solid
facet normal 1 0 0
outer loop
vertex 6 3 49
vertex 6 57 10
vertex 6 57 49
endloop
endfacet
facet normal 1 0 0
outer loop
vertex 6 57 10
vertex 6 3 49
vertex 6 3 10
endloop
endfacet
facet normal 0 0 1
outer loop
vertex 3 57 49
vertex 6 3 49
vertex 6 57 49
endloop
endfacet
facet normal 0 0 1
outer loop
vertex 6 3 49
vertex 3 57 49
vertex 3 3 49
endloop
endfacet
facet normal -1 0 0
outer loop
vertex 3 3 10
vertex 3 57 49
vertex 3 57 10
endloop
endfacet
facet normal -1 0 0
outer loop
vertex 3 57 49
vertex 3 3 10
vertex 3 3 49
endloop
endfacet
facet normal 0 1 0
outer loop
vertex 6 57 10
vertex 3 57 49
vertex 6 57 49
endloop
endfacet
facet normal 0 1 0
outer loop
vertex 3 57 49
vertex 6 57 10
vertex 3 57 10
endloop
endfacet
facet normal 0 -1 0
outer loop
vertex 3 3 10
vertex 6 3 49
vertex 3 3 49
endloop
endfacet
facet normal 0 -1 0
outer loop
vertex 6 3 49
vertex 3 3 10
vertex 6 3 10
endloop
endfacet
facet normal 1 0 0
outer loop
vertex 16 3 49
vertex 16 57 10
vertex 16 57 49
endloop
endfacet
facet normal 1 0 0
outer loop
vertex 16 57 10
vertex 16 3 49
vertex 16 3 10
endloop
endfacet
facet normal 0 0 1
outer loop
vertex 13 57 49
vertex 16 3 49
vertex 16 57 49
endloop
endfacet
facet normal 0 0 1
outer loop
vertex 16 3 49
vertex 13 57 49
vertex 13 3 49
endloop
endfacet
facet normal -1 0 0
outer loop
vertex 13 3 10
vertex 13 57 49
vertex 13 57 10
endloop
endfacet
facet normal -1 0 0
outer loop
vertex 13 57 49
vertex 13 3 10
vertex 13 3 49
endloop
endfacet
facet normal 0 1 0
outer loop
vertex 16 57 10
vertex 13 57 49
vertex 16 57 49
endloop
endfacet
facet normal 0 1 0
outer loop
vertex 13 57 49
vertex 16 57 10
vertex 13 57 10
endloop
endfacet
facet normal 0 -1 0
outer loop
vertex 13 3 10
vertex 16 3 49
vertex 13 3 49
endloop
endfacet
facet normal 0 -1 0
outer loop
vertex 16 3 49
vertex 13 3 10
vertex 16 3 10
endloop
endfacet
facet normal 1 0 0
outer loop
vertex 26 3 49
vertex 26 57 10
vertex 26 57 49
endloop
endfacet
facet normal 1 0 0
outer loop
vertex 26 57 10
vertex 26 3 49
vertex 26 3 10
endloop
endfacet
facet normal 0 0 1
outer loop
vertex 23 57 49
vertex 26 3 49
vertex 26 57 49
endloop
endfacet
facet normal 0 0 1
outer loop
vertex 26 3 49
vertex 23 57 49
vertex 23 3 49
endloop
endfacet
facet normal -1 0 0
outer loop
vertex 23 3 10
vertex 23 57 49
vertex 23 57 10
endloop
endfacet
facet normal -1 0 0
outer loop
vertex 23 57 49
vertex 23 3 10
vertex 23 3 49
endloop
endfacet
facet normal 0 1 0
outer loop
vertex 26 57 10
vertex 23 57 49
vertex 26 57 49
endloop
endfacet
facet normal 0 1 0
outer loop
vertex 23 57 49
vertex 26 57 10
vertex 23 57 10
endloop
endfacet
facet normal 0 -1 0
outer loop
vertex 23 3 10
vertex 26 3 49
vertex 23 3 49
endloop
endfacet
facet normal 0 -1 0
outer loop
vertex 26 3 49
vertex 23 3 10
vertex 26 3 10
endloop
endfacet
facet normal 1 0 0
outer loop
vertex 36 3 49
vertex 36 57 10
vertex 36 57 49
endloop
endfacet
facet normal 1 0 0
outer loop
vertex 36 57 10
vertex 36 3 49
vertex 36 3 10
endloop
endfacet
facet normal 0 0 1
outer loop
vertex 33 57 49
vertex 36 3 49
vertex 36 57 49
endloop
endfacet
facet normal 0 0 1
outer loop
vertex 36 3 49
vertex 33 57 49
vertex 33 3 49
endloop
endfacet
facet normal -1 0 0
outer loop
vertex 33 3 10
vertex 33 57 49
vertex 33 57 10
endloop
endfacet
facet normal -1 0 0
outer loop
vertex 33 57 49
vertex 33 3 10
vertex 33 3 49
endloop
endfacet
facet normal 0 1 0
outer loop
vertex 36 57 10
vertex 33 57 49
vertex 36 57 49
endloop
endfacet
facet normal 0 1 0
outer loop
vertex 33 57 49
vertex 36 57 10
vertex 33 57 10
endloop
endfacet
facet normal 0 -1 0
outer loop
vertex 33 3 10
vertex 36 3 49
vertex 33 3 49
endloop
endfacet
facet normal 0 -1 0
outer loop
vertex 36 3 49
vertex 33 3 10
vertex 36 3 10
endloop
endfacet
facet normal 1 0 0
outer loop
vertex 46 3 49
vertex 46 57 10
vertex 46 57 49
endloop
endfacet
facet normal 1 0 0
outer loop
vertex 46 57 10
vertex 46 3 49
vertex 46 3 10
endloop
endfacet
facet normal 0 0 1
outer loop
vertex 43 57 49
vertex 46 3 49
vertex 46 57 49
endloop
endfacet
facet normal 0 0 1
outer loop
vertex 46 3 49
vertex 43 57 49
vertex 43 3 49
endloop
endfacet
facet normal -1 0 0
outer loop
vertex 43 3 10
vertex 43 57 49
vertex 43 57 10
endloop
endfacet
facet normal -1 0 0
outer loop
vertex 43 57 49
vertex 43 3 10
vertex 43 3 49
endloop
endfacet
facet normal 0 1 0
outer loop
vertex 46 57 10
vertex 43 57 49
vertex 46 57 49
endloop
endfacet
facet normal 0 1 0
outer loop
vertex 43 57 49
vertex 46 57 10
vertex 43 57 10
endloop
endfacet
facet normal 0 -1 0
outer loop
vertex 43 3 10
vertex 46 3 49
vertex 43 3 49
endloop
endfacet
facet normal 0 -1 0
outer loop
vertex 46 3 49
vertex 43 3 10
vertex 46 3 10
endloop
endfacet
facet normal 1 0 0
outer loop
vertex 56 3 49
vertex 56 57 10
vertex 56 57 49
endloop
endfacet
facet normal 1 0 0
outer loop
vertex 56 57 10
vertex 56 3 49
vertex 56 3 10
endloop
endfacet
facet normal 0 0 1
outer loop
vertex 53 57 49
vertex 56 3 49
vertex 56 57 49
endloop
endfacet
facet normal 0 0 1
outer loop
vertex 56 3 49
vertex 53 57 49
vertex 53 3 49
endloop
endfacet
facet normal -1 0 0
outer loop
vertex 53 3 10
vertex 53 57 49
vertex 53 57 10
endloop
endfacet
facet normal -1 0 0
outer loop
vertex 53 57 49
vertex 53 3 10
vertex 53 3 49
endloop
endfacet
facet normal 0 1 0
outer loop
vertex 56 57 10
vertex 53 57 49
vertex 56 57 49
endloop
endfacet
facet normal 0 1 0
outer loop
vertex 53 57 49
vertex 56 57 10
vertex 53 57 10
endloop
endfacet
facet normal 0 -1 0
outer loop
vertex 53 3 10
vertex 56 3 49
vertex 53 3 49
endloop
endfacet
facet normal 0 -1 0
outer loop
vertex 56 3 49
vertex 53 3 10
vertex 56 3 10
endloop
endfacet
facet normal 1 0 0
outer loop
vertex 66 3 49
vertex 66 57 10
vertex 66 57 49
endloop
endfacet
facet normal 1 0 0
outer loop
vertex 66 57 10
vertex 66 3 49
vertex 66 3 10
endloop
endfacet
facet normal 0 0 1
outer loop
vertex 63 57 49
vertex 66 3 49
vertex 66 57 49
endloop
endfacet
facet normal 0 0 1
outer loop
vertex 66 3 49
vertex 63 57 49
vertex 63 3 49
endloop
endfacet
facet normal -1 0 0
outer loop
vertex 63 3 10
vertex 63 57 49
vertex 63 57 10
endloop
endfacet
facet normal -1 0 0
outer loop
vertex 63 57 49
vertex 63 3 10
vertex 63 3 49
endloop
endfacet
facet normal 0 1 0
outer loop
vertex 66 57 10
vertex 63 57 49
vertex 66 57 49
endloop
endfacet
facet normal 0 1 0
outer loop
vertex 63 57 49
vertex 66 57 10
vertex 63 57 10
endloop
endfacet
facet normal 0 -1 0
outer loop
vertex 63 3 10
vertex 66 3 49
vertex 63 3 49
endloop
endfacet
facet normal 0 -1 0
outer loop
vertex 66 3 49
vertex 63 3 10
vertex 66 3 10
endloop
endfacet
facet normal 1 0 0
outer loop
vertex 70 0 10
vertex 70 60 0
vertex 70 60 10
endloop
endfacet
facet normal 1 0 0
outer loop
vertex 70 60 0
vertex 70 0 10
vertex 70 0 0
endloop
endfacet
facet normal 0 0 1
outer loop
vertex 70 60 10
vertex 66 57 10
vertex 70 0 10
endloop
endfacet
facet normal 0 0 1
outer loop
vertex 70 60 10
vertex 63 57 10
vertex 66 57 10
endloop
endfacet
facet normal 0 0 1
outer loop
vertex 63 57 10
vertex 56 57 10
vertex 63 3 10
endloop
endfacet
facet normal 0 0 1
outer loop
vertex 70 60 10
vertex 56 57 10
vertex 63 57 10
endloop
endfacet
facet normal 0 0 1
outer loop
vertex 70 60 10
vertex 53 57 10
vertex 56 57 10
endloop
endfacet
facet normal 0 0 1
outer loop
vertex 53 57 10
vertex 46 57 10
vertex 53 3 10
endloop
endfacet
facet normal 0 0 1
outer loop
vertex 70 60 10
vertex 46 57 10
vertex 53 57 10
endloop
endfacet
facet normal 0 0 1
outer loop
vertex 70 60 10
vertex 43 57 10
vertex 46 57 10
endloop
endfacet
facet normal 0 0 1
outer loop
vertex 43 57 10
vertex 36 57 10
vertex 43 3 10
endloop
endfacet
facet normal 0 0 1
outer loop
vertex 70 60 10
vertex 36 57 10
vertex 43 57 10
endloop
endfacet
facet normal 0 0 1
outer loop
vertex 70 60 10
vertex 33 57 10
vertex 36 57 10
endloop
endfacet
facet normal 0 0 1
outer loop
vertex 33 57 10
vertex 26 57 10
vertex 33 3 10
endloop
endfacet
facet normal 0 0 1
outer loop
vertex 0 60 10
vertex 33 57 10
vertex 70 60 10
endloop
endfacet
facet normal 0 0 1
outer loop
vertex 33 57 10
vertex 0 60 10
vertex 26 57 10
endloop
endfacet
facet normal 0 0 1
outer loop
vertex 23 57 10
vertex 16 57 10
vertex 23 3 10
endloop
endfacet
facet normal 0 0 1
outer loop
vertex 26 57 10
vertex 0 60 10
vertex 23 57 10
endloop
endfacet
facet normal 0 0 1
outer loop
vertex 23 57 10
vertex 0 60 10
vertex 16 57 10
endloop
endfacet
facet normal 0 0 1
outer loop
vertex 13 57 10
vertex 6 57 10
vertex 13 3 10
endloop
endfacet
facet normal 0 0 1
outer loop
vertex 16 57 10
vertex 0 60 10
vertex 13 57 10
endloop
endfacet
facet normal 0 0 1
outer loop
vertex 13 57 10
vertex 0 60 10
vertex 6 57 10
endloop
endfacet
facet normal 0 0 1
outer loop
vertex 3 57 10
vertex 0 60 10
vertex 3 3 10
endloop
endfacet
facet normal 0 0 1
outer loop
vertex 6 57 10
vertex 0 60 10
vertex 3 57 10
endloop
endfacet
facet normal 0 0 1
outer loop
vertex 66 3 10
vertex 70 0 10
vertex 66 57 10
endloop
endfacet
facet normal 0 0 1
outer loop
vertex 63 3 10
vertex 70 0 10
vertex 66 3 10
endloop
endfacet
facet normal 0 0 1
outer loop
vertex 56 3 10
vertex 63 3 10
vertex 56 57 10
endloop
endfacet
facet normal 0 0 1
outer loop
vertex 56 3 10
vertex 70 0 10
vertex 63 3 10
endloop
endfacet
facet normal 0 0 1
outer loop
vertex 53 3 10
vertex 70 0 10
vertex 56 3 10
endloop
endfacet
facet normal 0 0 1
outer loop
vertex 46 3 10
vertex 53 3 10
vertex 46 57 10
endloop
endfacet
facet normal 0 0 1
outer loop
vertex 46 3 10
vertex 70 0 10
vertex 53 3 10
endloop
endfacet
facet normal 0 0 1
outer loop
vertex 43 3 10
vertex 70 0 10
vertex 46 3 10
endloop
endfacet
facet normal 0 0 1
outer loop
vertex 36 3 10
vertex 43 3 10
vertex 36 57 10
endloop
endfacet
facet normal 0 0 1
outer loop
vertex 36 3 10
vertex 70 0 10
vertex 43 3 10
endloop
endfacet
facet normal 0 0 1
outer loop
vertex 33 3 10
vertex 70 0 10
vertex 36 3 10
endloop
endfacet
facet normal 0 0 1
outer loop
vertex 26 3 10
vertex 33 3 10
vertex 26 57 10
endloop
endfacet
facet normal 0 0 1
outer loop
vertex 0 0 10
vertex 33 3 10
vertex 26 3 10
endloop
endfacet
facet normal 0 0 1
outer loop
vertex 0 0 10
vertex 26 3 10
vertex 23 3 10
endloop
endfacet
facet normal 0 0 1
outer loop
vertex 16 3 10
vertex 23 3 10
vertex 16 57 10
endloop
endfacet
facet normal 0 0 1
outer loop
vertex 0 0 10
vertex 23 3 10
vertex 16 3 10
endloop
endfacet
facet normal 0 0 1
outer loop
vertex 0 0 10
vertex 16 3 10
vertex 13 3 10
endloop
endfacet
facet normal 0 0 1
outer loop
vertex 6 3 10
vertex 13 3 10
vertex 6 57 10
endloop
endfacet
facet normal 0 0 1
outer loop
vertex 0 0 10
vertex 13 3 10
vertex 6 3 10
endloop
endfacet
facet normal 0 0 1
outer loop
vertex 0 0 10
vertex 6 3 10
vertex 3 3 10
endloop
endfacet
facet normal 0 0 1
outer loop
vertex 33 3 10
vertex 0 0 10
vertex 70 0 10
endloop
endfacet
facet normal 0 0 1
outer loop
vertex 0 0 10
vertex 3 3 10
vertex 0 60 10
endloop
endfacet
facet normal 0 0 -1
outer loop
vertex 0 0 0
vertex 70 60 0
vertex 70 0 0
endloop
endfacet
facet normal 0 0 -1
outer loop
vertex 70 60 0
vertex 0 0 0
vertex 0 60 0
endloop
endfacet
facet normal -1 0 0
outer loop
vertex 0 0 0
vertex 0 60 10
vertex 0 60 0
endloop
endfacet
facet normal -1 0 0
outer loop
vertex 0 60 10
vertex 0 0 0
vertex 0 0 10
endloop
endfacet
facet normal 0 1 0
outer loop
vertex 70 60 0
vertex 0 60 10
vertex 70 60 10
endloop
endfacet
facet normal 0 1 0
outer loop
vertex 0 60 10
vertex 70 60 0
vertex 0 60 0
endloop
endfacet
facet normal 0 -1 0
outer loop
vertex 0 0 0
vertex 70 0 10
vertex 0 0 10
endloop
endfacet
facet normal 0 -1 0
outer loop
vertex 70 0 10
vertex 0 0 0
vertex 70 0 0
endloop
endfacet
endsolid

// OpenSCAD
$fn = 32;

// ----------------------------------------------------------------------
// Heatsink: uniform fin block
// ----------------------------------------------------------------------

// --- parameters (mm) ---
base_l = 70;              // base length, X
base_w = 60;              // base width, Y
base_t = 10;              // base plate thickness
fin_h = 40;               // fin height above the base
fin_t = 3;                // fin thickness
edge = 3;                 // margin from the base ends
pitch = 10;               // fin pitch

n_fins = floor((base_l - 2 * edge - fin_t) / pitch) + 1;  // fin count
total_h = base_t + fin_h - 1;  // overall height

union() {
  cube([base_l, base_w, base_t]);
  for (i = [0 : n_fins - 1])
    translate([edge + i * pitch, edge, base_t - 1])
      cube([fin_t, base_w - 2 * edge, fin_h]);
}
